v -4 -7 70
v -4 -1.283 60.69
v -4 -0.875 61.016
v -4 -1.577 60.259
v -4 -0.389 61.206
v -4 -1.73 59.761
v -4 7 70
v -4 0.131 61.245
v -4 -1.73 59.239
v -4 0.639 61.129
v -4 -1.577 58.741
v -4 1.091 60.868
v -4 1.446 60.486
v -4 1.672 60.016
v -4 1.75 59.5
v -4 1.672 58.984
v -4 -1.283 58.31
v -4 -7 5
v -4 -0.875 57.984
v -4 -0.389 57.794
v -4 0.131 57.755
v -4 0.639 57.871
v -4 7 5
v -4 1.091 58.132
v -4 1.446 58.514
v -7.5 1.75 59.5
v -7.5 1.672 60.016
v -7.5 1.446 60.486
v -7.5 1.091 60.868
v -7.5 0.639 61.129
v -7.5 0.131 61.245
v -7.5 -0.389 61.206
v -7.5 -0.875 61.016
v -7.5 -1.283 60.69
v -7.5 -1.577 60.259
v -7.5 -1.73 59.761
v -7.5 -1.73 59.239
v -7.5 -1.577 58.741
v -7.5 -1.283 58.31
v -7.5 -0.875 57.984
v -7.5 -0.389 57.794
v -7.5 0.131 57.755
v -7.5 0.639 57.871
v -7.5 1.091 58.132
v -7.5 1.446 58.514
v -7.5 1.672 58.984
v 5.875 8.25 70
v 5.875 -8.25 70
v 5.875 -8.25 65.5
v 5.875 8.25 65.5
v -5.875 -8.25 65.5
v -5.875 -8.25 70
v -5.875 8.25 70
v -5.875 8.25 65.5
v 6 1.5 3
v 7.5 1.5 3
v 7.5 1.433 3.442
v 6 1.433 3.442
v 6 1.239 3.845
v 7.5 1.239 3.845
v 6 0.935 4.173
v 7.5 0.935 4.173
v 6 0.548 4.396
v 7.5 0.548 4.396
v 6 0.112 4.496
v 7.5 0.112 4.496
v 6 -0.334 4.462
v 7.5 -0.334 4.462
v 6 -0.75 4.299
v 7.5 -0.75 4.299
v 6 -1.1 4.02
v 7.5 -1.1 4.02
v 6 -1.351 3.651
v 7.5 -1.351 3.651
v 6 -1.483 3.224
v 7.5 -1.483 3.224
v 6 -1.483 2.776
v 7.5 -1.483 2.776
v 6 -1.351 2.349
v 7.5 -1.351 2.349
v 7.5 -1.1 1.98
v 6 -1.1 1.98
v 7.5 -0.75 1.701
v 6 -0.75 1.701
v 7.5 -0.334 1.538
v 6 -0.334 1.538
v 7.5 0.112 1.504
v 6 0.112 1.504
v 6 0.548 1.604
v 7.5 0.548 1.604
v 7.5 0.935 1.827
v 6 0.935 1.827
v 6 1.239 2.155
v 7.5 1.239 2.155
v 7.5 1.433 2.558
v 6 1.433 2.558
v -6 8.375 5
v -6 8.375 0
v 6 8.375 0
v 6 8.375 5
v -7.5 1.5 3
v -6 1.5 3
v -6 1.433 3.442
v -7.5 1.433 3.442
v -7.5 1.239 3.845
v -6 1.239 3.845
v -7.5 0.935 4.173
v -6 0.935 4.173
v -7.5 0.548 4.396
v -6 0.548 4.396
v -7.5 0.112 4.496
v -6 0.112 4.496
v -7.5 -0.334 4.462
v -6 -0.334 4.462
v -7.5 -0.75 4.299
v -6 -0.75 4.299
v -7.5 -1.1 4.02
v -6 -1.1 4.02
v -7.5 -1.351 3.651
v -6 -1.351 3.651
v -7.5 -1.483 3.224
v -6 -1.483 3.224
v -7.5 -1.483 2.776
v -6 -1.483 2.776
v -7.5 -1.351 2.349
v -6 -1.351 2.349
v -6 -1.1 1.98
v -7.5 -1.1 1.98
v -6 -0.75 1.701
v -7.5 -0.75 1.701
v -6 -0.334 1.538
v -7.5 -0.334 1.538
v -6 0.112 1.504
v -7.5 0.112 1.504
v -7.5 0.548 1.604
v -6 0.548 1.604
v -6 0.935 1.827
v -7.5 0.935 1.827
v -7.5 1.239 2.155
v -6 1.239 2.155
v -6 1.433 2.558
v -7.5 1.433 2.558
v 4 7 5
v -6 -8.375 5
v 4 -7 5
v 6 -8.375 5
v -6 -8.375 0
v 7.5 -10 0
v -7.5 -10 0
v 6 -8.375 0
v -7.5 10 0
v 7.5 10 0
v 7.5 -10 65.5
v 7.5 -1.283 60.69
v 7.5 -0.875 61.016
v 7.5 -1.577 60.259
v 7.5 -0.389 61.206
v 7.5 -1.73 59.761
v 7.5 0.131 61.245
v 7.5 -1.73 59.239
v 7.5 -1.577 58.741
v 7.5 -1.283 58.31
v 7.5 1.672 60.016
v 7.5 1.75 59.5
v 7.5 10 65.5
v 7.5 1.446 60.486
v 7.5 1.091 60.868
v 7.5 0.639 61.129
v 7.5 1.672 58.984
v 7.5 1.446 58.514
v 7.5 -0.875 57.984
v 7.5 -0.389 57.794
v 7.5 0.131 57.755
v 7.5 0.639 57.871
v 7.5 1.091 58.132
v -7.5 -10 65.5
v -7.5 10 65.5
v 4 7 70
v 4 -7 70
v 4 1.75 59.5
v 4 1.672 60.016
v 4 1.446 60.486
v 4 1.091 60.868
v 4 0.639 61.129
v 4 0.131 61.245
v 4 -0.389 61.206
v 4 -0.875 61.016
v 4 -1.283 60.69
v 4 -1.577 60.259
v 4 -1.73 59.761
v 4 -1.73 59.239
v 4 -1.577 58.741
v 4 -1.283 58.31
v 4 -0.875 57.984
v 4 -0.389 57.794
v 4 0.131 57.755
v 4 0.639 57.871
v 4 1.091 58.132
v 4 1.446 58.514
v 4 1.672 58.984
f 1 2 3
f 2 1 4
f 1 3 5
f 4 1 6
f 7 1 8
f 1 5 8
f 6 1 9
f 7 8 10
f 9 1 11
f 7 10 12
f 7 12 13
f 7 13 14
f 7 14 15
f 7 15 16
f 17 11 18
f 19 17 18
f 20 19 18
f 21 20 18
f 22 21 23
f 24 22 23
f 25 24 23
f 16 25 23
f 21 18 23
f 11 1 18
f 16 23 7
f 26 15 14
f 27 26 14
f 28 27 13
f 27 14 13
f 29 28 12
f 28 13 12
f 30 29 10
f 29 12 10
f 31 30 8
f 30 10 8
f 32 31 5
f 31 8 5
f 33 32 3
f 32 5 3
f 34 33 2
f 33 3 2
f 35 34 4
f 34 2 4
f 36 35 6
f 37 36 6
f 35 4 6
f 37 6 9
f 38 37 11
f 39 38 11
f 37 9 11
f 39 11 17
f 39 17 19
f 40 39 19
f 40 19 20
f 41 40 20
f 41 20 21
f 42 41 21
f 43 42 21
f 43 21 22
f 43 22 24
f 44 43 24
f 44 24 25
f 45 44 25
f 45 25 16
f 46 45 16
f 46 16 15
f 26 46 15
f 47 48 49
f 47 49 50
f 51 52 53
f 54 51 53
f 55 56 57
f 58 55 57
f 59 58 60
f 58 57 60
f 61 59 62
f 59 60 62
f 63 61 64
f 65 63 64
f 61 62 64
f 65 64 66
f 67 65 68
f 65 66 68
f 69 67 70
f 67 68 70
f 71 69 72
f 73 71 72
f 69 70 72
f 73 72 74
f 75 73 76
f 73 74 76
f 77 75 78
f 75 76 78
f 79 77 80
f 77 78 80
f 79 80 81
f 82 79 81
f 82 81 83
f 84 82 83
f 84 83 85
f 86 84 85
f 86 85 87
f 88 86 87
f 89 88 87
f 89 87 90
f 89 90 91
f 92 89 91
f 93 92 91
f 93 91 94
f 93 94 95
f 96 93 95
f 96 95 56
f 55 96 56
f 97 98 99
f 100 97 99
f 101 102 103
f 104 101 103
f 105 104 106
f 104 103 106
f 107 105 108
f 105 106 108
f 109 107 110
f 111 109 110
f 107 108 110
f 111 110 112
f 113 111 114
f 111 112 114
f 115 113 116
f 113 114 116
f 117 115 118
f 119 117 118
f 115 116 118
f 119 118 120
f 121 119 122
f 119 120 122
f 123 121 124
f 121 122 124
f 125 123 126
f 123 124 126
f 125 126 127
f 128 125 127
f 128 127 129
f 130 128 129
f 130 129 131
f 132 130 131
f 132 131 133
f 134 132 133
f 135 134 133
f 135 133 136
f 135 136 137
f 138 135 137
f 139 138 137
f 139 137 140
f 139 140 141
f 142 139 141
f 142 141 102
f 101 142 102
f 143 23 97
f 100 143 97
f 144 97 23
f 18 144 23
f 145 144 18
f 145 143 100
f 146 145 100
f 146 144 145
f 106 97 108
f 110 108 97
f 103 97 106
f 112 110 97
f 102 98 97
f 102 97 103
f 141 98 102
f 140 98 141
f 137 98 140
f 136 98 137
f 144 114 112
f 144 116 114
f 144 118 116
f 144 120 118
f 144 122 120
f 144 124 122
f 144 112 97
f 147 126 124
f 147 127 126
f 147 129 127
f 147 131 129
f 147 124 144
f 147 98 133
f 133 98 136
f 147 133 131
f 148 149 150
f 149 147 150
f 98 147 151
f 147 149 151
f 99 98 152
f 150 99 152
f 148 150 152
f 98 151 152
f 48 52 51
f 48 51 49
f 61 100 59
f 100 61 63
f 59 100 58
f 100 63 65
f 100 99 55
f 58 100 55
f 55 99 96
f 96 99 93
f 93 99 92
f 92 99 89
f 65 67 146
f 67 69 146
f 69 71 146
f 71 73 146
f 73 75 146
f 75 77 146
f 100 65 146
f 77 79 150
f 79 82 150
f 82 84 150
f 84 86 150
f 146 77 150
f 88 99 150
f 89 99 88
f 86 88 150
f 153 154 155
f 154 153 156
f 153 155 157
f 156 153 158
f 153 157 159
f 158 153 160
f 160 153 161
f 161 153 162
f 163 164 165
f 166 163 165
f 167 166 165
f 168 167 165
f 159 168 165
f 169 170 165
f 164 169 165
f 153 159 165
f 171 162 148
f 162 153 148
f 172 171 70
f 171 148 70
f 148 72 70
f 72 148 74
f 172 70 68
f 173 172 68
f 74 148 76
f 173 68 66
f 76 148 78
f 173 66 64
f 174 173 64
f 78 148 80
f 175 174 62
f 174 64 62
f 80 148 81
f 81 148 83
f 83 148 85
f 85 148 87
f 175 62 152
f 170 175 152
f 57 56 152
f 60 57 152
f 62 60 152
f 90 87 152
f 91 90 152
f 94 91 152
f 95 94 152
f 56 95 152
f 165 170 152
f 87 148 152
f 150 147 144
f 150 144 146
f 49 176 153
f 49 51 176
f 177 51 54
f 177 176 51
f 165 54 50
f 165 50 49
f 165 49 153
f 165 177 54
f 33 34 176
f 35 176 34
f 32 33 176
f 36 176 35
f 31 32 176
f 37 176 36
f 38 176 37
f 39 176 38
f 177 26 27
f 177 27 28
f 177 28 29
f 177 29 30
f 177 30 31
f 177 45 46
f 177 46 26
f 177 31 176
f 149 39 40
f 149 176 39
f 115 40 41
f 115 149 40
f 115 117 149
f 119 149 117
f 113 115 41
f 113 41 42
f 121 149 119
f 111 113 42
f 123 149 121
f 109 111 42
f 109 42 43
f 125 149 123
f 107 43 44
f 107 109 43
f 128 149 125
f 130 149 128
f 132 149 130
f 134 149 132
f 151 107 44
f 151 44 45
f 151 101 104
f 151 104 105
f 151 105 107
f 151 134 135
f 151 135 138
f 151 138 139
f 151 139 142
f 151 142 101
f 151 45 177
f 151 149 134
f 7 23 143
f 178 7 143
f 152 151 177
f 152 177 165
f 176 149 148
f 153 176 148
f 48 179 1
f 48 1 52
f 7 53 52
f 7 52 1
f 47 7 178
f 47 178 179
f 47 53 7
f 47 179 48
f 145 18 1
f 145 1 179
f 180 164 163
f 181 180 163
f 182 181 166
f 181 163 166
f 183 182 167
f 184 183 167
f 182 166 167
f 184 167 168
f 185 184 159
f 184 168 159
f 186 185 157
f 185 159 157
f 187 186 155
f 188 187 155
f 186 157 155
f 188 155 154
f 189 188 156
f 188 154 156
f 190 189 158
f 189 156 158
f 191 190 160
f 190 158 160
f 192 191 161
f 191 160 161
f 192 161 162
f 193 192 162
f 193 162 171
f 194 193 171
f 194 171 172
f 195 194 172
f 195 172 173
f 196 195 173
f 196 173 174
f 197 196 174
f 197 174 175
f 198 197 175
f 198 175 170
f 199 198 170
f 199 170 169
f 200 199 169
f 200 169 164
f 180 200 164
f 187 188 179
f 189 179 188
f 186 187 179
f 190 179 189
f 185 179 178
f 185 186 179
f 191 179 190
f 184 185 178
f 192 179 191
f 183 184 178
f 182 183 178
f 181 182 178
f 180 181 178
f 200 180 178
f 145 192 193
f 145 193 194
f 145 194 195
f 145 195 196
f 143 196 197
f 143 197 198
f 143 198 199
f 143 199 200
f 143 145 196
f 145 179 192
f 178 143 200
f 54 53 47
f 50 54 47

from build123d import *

# Parameters (mm, degrees)
F0_W     = 15
F0_H     = 20
F0_W_2   = 8
F0_H_2   = 14
F1_DEPTH = 70
F2_W     = 18.400512
F2_H     = 24.49468
F2_W_2   = 11.75
F2_H_2   = 16.5
F3_DEPTH = 4.5
F4_R     = 1.75
F4_R_2   = 1.5
F5_DEPTH = 25
F6_W     = 12
F6_H     = 16.75
F7_DEPTH = 5


with BuildPart() as f1:
    # F0 (on Top) → F1 (new body)
    with BuildSketch(Plane.XY):
        Rectangle(F0_W, F0_H)
        Rectangle(F0_W_2, F0_H_2, mode=Mode.SUBTRACT)
    extrude(amount=F1_DEPTH)

    # F2 (on face) → F3 (cut)
    with BuildSketch(Plane.XY.offset(70)):
        Rectangle(F2_W, F2_H)
        Rectangle(F2_W_2, F2_H_2, mode=Mode.SUBTRACT)
    extrude(amount=-F3_DEPTH, mode=Mode.SUBTRACT)

    # F4 (on face) → F5 (cut)
    with BuildSketch(Plane.YZ.offset(7.5)):
        with Locations((0, 59.5)):
            Circle(F4_R)
        with Locations((0, 3)):
            Circle(F4_R_2)
    extrude(amount=-F5_DEPTH, mode=Mode.SUBTRACT)

    # F6 (on face) → F7 (cut)
    with BuildSketch(Plane(origin=(0, 0, 0), x_dir=(1, 0, 0), z_dir=(0, 0, -1))):
        Rectangle(F6_W, F6_H)
    extrude(amount=-F7_DEPTH, mode=Mode.SUBTRACT)


solid = f1.part
